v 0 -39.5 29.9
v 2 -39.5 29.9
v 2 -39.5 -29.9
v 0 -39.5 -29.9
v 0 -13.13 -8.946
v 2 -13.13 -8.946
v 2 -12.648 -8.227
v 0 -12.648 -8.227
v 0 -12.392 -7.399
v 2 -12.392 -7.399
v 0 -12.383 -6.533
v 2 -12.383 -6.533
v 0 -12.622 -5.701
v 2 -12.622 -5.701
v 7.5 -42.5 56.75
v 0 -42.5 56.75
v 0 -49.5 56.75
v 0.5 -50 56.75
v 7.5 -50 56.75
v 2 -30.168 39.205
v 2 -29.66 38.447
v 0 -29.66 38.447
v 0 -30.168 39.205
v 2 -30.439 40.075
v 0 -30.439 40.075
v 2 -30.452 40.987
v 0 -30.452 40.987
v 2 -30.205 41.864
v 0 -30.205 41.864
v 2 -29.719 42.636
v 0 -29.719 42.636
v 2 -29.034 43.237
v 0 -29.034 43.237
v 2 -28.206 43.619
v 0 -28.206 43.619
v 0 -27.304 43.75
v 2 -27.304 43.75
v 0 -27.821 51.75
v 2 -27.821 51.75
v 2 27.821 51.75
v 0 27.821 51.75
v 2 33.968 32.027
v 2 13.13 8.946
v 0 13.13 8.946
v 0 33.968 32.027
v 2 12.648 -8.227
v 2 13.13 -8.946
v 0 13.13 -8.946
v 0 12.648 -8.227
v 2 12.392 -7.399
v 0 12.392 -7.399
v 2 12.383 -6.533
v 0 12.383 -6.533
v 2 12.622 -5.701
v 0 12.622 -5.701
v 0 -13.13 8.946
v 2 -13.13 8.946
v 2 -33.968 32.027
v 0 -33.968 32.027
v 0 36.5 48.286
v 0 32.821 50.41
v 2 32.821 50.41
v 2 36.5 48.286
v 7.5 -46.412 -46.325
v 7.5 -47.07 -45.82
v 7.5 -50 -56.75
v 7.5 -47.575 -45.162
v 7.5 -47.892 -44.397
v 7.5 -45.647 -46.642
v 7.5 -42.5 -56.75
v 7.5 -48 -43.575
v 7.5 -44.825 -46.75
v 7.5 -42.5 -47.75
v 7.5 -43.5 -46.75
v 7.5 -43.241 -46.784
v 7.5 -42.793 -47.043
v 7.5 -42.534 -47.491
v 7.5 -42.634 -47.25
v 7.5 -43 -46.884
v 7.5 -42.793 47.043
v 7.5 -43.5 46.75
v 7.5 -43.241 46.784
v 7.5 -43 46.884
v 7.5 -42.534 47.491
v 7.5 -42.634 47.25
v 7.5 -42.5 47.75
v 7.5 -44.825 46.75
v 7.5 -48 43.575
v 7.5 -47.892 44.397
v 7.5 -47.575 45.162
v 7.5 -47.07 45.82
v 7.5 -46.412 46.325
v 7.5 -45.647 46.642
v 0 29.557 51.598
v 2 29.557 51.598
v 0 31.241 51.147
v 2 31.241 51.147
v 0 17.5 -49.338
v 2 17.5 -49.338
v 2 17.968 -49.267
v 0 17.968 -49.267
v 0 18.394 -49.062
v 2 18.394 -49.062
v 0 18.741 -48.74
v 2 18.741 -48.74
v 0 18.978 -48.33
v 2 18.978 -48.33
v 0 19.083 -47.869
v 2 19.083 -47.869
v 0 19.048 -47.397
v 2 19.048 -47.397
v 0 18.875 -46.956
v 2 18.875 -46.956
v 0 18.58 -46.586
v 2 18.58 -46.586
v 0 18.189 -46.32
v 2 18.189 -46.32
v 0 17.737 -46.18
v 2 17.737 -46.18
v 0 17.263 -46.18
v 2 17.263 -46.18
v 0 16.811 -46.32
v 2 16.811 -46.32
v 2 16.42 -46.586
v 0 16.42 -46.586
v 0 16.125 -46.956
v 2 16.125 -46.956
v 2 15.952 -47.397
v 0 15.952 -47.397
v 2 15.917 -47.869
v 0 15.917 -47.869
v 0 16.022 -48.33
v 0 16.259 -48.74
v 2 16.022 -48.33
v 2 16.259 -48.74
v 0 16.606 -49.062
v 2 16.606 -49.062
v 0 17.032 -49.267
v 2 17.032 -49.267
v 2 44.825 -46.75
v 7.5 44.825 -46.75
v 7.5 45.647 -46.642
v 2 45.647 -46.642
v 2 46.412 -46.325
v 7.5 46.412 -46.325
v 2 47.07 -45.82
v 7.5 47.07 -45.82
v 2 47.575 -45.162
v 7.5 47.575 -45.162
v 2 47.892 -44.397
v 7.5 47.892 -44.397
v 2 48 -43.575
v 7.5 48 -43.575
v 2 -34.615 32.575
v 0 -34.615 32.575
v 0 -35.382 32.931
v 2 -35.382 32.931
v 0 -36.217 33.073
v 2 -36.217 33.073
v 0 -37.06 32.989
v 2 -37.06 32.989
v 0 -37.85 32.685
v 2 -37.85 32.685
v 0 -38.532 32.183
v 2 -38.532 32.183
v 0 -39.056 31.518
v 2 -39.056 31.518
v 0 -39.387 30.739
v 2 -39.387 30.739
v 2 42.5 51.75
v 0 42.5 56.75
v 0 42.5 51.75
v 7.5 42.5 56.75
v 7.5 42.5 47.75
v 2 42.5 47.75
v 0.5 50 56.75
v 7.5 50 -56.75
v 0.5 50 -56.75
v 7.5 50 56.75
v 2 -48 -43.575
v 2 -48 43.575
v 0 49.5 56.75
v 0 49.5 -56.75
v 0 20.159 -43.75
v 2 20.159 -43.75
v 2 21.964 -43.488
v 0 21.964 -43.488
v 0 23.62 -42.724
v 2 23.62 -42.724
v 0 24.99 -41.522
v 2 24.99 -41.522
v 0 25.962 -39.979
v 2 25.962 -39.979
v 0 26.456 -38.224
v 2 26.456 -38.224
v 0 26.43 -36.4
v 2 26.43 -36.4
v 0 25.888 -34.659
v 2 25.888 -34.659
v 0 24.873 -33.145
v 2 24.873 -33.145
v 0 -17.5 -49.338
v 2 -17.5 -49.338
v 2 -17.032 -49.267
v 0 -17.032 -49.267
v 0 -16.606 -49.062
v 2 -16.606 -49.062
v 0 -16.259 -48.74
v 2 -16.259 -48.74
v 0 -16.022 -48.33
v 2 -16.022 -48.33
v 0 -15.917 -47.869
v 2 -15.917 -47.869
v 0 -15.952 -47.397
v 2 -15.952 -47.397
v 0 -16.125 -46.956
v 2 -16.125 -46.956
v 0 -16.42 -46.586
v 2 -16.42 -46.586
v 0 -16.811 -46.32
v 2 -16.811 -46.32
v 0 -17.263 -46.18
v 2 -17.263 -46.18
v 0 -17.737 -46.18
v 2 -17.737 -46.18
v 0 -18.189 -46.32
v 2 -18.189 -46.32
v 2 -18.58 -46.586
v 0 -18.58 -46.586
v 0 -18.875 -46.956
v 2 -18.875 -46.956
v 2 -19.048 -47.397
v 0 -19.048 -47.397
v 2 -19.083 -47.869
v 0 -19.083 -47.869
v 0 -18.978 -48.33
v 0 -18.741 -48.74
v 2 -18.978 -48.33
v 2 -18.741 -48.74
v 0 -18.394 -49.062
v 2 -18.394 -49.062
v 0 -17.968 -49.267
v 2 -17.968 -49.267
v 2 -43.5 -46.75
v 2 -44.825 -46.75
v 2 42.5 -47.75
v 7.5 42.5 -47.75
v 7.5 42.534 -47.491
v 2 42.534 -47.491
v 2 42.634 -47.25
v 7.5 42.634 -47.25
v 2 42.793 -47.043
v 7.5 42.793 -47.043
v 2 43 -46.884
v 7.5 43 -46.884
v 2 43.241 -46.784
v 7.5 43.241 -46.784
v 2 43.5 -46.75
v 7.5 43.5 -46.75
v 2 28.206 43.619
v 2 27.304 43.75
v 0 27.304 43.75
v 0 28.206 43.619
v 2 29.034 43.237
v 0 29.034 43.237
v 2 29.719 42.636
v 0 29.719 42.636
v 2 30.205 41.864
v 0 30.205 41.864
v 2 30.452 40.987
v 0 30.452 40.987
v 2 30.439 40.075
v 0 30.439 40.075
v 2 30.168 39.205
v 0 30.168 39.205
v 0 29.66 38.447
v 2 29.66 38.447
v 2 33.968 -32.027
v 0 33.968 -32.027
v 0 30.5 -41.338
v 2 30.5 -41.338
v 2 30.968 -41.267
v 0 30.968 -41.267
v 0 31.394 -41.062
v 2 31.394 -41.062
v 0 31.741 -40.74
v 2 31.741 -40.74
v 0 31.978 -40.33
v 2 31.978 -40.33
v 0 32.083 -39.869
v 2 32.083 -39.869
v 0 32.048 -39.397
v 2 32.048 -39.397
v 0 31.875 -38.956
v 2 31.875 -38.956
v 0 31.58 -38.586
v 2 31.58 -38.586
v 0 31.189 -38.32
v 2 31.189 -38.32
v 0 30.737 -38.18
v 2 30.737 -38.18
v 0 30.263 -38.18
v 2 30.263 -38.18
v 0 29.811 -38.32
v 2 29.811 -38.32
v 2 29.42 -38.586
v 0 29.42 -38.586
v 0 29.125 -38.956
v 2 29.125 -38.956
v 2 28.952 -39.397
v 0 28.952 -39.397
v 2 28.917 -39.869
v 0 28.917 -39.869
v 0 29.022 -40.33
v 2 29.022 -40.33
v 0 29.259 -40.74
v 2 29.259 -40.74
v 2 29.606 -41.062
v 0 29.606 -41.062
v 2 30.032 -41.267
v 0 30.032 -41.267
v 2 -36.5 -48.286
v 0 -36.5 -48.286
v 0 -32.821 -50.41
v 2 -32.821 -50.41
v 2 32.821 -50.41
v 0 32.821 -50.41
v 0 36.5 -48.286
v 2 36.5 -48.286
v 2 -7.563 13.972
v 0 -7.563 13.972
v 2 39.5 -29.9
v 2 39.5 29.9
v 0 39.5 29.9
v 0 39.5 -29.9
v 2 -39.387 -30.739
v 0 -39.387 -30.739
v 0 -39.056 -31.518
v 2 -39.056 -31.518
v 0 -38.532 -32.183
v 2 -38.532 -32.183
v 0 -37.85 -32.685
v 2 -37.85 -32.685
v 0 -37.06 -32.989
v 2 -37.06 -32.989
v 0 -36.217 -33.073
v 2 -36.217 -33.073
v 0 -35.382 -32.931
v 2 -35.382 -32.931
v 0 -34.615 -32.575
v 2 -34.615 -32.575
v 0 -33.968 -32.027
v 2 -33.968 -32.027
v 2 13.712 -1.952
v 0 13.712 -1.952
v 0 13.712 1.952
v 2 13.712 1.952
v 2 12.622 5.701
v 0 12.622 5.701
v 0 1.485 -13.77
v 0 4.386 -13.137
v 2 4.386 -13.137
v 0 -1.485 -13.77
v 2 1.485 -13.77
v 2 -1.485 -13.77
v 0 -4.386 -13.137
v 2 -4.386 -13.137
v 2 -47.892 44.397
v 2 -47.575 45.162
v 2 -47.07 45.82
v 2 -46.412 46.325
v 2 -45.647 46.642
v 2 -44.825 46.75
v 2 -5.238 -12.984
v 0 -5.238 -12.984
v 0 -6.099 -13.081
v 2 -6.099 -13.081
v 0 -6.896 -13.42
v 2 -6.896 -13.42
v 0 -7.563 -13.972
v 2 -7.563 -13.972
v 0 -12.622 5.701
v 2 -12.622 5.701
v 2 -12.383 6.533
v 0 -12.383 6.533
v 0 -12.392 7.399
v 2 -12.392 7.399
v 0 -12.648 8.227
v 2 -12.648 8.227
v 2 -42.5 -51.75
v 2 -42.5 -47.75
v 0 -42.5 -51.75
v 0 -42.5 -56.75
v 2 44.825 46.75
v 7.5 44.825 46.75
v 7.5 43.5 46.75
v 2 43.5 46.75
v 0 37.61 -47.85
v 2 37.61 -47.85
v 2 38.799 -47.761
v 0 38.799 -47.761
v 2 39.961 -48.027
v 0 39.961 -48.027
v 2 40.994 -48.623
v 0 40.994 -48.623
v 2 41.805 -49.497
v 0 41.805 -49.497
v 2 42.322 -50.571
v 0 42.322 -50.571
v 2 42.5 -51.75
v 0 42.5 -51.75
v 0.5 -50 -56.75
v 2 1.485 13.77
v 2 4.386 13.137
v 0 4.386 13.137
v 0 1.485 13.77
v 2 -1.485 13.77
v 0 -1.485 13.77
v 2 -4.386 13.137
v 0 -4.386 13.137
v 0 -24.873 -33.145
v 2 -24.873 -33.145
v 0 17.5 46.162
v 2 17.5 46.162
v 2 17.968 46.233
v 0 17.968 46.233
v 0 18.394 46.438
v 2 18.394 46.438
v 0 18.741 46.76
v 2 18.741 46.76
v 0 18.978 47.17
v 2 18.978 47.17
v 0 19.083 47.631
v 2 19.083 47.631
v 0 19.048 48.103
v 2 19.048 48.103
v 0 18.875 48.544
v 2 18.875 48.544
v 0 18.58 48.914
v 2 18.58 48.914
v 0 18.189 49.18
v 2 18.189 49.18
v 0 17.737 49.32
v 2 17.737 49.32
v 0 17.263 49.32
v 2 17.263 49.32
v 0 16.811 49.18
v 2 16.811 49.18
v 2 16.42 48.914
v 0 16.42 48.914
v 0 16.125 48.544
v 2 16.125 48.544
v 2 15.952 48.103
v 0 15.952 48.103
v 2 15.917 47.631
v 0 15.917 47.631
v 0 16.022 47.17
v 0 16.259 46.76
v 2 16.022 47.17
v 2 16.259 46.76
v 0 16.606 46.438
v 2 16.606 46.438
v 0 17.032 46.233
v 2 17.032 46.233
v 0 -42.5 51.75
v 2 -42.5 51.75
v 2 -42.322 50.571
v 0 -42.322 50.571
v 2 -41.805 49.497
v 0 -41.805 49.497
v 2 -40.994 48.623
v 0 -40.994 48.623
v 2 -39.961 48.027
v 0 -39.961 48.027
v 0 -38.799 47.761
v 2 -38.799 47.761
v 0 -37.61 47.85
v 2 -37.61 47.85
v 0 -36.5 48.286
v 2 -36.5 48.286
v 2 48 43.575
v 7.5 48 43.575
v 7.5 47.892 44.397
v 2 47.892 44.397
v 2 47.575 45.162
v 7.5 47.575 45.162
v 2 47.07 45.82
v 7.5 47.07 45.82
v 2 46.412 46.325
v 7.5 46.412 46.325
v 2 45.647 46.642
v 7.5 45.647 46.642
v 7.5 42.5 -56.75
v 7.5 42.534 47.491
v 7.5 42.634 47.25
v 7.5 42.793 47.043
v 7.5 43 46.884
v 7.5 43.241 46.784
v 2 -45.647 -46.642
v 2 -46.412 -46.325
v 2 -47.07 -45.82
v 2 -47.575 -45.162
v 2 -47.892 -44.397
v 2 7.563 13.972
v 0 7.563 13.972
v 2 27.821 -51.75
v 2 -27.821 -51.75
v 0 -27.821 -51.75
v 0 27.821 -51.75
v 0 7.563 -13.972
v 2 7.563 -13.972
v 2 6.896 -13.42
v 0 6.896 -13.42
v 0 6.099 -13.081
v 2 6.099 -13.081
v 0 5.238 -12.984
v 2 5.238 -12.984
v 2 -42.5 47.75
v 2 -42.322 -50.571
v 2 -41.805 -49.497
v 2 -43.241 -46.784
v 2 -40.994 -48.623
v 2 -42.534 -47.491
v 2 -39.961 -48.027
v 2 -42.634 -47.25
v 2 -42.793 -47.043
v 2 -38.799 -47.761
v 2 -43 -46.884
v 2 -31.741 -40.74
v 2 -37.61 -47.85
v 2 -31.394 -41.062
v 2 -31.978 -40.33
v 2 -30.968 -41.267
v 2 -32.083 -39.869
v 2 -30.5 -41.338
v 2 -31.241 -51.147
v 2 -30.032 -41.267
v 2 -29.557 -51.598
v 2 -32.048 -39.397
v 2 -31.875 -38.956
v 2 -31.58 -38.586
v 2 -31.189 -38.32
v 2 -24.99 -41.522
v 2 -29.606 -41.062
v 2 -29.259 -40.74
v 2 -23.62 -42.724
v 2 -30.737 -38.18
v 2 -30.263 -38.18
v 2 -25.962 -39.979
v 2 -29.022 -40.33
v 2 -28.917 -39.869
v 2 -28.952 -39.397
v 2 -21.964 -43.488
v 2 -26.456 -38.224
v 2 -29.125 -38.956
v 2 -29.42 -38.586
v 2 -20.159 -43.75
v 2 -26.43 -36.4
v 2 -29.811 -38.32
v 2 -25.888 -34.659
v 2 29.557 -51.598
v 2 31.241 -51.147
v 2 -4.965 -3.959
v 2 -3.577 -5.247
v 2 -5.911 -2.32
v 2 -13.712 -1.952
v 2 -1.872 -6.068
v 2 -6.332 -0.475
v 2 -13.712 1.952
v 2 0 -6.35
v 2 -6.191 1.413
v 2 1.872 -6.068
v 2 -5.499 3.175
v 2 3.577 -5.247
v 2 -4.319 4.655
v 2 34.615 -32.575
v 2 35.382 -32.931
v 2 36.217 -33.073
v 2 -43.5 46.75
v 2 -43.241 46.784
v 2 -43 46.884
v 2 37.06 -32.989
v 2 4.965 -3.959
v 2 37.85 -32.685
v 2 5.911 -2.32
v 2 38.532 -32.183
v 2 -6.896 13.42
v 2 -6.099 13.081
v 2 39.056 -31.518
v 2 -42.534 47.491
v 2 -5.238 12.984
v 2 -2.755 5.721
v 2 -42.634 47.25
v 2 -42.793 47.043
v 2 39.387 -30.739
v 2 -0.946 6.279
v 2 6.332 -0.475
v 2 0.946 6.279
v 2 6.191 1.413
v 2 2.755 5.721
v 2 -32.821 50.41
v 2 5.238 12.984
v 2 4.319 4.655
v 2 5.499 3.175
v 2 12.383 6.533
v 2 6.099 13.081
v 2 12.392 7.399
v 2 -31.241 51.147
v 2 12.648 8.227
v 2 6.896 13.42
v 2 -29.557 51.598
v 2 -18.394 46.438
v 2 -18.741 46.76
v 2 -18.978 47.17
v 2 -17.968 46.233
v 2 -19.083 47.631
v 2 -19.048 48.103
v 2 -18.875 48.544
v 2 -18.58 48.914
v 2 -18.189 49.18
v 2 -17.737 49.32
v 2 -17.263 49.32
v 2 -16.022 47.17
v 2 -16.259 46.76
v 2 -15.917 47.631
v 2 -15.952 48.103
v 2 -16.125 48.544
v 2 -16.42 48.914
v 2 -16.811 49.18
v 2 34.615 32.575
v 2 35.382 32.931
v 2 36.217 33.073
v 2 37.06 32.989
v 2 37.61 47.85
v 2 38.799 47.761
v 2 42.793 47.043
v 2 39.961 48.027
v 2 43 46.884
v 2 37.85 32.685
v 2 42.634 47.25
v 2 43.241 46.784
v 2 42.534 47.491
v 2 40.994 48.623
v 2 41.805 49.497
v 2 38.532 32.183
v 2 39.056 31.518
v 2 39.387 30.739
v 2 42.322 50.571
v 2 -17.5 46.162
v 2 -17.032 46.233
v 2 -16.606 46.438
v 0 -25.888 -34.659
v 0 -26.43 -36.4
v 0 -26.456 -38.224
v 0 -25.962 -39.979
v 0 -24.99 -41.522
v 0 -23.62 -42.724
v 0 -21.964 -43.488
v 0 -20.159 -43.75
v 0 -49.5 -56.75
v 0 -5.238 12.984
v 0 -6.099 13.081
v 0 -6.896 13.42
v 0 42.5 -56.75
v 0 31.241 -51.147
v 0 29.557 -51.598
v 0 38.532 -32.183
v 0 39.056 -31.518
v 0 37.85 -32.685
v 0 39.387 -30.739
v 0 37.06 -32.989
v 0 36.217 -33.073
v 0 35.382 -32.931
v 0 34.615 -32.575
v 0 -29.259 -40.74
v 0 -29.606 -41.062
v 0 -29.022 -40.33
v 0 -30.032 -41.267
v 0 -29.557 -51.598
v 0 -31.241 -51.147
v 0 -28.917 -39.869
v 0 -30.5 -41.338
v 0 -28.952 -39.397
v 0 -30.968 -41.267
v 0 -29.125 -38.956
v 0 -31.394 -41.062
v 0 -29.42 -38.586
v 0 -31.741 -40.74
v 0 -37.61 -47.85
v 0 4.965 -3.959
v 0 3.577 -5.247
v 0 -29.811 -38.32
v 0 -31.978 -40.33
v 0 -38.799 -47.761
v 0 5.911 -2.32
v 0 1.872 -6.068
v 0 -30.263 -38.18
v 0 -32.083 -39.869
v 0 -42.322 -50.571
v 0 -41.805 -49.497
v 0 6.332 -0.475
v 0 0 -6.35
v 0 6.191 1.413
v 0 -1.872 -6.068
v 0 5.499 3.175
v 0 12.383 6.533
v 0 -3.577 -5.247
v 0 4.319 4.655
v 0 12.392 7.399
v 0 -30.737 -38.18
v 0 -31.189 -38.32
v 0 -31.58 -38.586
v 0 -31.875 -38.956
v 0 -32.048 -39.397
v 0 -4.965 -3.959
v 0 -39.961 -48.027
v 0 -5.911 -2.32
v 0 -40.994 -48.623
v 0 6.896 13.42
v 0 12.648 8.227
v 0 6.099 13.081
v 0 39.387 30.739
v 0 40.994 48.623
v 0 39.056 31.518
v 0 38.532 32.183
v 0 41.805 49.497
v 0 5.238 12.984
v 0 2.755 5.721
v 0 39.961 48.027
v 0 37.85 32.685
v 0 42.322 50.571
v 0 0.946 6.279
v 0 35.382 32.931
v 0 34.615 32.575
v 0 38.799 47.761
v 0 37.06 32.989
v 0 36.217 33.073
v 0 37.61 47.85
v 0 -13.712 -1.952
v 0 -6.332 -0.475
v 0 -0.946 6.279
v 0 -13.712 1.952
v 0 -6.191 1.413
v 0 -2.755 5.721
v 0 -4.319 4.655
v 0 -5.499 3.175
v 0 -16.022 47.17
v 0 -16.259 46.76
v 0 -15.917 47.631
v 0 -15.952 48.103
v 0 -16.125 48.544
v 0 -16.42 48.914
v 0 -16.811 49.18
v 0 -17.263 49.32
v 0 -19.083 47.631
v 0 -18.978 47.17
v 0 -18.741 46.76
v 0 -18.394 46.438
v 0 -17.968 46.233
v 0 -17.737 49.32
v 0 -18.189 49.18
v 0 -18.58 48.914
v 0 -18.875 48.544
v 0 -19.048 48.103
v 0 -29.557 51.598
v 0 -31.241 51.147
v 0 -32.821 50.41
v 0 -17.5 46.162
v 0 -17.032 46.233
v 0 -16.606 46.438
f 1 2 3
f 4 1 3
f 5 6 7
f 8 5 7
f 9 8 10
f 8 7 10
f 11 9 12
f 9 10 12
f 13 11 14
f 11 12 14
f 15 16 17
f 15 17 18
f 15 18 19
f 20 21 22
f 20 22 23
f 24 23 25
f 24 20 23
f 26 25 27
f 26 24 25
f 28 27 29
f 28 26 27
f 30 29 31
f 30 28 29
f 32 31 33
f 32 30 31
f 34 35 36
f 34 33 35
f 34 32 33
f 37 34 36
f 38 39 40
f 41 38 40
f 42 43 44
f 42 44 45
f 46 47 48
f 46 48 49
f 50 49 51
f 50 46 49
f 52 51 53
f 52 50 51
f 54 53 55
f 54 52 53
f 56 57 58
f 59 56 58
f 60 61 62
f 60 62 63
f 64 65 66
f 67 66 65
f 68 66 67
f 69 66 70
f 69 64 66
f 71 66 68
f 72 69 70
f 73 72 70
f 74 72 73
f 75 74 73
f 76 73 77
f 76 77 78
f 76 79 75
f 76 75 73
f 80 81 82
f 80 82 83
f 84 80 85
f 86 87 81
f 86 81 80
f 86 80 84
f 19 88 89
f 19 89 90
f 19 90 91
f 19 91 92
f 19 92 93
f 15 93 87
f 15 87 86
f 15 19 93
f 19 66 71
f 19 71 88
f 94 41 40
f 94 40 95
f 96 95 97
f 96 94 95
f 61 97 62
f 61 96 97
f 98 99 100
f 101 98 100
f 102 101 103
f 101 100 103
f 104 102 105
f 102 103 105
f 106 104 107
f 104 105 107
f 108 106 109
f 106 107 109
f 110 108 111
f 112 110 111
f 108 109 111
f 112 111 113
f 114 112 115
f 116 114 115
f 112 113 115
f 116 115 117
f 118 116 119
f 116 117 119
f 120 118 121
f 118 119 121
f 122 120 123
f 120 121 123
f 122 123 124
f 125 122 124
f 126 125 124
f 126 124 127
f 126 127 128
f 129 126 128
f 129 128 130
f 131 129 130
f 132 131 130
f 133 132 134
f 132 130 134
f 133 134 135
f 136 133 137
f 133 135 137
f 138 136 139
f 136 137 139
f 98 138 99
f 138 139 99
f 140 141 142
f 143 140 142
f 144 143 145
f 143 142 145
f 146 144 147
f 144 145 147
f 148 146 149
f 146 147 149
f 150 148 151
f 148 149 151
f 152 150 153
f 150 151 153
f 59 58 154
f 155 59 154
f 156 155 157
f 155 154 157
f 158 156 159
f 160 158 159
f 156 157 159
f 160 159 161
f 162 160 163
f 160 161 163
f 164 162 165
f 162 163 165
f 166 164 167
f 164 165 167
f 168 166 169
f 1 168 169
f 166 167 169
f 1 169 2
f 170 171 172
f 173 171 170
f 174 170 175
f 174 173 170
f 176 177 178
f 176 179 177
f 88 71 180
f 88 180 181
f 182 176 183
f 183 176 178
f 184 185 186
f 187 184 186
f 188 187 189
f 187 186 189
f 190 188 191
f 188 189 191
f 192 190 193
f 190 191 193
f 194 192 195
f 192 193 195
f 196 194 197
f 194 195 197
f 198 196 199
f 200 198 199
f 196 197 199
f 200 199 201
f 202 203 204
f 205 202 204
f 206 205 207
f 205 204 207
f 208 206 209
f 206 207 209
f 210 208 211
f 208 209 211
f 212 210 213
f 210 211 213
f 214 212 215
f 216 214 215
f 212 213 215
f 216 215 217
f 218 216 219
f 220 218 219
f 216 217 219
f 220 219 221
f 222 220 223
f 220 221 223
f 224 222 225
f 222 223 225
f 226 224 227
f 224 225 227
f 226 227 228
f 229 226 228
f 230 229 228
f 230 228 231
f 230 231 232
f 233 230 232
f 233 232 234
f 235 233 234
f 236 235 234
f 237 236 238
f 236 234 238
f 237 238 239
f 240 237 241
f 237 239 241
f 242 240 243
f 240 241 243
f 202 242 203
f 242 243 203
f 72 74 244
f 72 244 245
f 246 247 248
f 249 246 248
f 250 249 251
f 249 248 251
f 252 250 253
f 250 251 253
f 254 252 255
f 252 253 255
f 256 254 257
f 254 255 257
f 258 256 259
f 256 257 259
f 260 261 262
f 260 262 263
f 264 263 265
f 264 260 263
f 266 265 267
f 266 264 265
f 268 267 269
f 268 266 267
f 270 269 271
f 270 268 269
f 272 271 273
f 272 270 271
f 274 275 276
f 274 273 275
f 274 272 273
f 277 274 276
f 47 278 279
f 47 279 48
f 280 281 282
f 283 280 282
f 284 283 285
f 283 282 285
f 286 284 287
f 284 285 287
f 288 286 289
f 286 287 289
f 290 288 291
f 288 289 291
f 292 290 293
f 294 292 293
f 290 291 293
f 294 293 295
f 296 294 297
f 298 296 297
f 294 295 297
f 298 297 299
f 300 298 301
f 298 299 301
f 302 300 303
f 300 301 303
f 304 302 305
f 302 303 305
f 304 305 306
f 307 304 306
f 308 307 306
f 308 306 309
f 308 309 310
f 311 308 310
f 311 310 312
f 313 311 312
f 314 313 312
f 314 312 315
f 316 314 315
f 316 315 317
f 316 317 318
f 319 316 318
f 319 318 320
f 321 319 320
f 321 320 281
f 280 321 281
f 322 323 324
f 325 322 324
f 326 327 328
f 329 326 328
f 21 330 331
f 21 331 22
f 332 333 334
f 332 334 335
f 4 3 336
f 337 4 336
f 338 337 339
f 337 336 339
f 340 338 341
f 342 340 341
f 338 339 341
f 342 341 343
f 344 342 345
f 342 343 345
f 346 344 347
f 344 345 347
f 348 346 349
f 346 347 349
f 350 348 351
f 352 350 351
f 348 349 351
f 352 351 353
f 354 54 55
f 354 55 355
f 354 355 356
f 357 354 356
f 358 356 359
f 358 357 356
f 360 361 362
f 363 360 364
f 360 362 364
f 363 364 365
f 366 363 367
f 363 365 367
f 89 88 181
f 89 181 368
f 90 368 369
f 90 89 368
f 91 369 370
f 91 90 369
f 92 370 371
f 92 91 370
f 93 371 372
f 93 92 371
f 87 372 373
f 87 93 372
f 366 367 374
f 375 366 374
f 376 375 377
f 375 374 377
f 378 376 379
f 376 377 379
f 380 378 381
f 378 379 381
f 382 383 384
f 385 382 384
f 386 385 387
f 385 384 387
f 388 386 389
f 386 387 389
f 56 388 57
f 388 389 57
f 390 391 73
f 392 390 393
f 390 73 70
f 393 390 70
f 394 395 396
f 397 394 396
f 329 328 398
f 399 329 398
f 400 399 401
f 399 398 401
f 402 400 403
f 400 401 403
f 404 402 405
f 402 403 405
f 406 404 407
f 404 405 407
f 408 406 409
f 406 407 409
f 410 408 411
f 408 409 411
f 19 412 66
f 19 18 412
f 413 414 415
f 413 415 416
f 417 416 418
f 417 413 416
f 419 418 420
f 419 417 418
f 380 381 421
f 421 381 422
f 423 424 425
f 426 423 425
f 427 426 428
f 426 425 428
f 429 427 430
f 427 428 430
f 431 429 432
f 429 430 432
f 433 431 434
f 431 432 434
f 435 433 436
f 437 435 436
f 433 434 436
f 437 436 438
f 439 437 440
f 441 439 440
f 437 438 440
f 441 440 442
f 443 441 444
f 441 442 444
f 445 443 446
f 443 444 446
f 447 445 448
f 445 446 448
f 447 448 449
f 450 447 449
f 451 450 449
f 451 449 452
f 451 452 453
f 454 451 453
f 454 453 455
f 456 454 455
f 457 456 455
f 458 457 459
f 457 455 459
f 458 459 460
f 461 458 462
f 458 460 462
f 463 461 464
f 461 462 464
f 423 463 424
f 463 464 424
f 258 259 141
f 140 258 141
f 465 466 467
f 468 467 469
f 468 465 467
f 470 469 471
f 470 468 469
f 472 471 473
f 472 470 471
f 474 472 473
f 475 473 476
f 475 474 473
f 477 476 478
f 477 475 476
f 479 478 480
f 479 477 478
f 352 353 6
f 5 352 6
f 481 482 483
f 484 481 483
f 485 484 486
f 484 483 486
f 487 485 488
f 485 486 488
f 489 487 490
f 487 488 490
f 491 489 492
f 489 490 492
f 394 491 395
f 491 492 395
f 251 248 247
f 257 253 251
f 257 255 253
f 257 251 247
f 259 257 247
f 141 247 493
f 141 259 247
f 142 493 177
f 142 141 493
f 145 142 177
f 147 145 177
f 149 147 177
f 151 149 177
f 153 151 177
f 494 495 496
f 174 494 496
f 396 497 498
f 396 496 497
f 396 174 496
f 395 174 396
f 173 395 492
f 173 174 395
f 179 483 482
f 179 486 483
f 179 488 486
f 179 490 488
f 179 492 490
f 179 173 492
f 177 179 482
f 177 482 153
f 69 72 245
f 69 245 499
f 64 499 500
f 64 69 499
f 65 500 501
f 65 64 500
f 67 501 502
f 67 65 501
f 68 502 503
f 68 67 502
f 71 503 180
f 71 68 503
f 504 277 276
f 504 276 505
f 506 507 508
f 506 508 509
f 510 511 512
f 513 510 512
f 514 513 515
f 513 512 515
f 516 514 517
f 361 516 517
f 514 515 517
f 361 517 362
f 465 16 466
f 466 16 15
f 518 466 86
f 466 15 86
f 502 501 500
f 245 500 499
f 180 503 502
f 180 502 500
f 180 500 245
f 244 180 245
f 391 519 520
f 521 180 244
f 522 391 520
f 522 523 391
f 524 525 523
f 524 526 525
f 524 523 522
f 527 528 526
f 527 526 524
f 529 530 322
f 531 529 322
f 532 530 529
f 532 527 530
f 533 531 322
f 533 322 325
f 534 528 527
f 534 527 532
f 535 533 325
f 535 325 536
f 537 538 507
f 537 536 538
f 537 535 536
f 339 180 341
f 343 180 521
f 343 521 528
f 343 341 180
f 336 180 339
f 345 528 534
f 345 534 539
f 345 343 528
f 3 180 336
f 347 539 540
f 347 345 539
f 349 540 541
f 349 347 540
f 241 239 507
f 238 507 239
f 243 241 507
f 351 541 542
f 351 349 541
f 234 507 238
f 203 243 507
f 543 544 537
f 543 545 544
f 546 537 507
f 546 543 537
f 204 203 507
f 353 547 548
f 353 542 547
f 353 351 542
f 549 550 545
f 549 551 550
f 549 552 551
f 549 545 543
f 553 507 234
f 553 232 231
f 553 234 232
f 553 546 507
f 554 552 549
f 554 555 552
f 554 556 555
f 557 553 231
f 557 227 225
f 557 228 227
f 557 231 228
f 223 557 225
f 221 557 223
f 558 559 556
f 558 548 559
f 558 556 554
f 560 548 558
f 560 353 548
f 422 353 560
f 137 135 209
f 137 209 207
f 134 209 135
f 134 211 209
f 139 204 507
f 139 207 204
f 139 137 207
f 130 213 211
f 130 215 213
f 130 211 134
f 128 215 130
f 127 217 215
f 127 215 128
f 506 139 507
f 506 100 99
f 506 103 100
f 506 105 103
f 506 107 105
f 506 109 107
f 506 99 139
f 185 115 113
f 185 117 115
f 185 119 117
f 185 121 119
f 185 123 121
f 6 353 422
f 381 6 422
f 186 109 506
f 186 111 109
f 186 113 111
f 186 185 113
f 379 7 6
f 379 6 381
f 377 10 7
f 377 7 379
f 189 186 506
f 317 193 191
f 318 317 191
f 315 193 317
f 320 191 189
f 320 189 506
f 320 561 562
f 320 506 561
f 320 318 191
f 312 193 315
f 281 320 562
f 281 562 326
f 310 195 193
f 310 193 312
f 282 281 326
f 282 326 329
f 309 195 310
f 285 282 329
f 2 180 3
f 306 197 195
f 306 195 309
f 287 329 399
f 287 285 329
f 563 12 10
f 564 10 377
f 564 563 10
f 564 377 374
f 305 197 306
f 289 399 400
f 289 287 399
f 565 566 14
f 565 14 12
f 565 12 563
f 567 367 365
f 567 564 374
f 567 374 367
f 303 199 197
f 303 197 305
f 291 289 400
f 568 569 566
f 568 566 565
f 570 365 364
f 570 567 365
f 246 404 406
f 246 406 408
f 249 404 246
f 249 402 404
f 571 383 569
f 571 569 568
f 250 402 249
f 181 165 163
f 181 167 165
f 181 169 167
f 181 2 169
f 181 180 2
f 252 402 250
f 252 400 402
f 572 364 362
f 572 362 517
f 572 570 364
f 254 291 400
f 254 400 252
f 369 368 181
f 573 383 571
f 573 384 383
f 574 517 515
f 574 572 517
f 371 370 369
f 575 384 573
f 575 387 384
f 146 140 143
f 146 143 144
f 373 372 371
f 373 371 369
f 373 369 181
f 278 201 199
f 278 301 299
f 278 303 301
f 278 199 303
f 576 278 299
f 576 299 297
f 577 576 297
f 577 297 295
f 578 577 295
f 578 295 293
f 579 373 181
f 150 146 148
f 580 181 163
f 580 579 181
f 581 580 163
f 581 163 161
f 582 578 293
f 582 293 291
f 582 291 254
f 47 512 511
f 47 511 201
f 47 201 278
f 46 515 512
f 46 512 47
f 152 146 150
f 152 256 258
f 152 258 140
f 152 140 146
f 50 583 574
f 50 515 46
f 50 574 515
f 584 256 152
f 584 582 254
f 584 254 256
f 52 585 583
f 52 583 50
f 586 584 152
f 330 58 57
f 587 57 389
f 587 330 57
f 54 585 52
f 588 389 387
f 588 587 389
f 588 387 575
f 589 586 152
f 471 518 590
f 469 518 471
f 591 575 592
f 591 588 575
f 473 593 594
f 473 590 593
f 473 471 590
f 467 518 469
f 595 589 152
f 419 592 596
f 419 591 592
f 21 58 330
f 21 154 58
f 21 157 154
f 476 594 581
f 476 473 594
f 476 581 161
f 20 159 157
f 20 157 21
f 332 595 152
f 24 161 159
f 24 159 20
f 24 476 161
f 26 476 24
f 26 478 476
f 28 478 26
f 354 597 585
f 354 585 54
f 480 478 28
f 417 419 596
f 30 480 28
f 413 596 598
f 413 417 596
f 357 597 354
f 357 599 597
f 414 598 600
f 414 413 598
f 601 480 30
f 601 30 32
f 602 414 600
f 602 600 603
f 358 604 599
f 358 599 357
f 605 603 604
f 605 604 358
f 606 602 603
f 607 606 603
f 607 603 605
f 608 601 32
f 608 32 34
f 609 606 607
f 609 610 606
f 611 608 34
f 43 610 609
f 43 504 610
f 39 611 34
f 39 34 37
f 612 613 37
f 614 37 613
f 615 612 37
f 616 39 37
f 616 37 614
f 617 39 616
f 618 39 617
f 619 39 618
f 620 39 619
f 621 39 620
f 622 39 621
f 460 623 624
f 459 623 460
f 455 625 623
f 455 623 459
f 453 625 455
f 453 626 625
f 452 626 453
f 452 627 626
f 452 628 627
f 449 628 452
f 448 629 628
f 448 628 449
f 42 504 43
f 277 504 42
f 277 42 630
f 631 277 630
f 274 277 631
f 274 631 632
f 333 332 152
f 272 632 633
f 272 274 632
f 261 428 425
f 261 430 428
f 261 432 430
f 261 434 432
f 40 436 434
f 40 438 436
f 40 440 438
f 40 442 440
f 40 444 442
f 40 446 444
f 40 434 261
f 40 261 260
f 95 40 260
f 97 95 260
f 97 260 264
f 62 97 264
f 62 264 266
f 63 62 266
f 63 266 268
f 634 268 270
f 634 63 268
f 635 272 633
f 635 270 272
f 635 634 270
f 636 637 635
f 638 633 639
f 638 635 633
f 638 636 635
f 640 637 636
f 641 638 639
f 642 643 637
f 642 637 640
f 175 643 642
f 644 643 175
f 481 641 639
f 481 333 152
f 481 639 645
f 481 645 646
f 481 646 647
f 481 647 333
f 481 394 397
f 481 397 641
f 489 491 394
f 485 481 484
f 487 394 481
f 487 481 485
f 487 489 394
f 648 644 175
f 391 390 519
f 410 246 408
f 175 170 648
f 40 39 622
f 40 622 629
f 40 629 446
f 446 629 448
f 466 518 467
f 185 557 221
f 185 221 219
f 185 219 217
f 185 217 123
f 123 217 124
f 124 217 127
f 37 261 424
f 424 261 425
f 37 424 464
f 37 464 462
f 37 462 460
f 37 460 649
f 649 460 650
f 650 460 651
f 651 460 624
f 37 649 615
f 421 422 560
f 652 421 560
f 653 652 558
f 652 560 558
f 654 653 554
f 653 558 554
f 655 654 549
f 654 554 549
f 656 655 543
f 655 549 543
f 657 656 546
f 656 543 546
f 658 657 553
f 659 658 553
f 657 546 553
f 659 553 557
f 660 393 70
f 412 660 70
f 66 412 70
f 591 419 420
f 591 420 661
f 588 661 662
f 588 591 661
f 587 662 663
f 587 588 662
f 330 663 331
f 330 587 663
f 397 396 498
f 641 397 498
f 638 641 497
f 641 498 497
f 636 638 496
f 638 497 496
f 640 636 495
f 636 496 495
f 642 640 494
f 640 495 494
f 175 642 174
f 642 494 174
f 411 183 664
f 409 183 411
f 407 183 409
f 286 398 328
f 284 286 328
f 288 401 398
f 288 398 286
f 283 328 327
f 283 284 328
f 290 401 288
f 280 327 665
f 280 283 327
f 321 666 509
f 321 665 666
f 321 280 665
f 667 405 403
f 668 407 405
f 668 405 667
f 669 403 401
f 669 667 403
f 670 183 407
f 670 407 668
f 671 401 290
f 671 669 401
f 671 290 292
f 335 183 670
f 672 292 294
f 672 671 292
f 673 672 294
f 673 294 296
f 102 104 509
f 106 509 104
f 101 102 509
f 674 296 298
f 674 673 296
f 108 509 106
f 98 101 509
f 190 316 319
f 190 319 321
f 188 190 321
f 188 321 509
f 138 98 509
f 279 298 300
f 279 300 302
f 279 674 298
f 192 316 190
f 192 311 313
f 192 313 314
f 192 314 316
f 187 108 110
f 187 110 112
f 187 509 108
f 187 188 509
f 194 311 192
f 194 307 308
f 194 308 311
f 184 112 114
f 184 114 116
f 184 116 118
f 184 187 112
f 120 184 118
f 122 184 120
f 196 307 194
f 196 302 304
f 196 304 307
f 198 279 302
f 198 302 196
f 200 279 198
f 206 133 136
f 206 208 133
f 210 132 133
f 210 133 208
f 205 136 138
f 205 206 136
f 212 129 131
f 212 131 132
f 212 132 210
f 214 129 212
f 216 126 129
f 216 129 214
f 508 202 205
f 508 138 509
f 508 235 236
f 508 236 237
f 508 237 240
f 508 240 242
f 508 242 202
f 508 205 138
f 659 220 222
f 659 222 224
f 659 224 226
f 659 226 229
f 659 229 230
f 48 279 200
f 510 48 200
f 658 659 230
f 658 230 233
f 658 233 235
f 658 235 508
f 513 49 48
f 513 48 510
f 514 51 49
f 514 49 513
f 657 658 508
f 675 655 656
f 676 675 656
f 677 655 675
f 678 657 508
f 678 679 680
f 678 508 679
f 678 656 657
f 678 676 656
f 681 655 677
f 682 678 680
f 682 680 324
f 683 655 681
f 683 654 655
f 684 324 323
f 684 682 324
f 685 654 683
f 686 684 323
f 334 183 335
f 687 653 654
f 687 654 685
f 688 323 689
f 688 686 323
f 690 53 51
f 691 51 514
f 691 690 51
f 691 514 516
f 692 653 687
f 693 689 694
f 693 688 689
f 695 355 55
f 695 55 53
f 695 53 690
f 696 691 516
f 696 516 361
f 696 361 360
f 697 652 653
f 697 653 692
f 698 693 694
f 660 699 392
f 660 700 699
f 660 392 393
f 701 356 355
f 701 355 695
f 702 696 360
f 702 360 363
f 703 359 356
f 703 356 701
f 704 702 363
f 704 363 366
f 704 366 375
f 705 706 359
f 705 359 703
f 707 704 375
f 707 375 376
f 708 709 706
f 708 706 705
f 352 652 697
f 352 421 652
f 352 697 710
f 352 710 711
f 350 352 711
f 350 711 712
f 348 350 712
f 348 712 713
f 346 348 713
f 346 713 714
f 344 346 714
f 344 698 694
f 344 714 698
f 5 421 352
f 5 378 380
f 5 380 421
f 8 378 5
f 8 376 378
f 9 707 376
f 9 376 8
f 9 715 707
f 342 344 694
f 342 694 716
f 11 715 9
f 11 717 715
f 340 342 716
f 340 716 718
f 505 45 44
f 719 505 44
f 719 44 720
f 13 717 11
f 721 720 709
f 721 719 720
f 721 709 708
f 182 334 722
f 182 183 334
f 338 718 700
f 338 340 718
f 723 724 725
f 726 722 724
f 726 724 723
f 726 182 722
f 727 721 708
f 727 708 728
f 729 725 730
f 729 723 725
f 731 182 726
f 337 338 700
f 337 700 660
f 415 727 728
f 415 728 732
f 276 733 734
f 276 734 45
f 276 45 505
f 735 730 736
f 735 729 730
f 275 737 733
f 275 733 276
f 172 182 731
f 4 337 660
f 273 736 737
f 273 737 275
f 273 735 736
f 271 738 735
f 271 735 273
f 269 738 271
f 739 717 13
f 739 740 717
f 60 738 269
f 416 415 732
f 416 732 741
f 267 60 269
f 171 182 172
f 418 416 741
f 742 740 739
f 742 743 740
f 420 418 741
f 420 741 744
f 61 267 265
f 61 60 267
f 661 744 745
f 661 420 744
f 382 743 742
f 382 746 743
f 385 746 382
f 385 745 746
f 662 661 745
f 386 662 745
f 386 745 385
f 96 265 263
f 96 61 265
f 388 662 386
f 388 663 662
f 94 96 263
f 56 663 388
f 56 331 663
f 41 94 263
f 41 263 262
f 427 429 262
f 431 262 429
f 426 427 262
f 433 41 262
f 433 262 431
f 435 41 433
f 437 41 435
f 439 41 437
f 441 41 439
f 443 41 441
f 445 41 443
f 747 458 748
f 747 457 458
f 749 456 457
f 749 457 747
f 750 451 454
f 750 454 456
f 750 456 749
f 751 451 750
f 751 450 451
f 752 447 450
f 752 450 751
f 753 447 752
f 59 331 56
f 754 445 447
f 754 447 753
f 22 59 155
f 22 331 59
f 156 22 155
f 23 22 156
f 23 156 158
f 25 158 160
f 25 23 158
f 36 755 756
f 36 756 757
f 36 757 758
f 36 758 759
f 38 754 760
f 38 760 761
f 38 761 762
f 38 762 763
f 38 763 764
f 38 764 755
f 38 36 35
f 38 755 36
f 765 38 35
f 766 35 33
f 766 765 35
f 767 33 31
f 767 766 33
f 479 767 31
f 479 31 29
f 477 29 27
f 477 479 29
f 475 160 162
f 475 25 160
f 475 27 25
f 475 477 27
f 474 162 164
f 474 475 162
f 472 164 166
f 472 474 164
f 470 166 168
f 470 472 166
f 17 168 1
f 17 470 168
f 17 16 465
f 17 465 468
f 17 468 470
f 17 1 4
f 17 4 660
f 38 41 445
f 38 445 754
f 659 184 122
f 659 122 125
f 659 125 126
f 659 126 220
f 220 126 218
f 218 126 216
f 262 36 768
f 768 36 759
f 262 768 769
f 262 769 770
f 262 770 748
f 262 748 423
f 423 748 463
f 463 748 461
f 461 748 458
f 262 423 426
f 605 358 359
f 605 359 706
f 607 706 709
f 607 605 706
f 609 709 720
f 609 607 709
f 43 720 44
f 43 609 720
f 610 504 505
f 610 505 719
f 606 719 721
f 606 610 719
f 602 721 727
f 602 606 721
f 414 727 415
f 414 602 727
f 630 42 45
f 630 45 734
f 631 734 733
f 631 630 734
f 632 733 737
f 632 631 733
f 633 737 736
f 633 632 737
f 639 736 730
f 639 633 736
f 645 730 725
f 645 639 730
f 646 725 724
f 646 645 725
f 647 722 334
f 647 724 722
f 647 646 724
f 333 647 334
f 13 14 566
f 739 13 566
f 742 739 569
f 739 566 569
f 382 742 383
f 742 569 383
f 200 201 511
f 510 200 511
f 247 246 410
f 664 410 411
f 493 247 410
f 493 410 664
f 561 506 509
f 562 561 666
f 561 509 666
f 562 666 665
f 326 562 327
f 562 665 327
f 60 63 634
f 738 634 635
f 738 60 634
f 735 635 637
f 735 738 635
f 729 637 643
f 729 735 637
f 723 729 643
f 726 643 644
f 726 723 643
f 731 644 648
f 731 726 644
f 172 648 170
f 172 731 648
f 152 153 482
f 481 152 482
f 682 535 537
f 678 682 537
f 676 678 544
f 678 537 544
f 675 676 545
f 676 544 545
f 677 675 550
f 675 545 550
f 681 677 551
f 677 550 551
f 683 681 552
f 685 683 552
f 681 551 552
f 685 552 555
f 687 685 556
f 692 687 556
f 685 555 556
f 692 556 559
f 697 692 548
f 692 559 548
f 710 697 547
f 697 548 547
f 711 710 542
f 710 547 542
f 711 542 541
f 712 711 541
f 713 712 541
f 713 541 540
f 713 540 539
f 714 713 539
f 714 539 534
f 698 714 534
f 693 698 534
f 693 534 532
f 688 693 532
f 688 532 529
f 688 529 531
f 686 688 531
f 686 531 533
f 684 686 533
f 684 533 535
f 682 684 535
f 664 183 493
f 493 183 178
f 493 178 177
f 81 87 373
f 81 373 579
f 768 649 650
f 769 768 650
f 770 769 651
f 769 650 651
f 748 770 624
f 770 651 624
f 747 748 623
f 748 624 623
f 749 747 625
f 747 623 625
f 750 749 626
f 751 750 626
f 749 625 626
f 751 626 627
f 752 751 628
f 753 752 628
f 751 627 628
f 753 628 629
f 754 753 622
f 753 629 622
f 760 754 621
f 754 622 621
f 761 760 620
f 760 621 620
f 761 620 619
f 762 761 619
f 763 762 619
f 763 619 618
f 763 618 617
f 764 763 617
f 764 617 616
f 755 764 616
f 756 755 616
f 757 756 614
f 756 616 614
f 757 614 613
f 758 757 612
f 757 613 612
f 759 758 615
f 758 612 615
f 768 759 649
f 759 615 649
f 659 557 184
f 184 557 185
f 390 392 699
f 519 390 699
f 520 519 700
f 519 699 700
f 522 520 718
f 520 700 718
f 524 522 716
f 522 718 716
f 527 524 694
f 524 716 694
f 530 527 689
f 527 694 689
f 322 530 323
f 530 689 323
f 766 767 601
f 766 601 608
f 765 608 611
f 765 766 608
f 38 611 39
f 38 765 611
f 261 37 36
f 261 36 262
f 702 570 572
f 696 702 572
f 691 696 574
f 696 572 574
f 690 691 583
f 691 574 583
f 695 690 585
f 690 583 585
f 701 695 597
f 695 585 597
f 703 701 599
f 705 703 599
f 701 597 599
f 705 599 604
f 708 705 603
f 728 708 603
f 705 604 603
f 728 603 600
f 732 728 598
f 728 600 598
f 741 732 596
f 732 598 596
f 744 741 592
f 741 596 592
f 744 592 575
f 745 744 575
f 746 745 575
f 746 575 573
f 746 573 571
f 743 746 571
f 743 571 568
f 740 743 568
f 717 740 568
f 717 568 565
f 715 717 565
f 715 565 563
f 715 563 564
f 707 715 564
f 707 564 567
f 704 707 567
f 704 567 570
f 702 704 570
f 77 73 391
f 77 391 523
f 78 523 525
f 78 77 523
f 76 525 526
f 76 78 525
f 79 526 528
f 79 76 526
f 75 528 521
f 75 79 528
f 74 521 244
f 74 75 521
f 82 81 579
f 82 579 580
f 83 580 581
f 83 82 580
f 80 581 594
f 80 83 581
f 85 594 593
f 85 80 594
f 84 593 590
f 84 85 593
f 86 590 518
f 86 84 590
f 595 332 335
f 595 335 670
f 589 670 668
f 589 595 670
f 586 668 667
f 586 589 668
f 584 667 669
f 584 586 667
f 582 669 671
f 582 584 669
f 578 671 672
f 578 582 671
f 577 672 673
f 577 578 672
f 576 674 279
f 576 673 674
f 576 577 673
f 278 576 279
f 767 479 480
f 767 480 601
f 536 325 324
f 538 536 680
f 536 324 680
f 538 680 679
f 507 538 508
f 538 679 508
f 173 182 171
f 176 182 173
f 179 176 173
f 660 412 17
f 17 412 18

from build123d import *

# Parameters (mm, degrees)
BOSS_EXTRUDE1_DEPTH = 56.75
SKETCH2_W           = 5
SKETCH2_H           = 85
SKETCH2_R           = 1.5875
CUT_EXTRUDE1_DEPTH  = 2
SKETCH3_R           = 6.35
SKETCH3_R_2         = 1.5875
CUT_EXTRUDE2_DEPTH  = 3
CHAMFER1_SIZE       = 0.5
CUT_EXTRUDE3_DEPTH  = 5.5
CUT_EXTRUDE4_DEPTH  = 10


with BuildPart() as part:
    # Sketch1 → Boss-Extrude1 (new body, symmetric)
    with BuildSketch(Plane.XY):
        Polygon((0, 50), (0, -50), (7.5, -50), (7.5, -42.5), (2, -42.5), (2, 42.5), (7.5, 42.5), (7.5, 50), align=None)
    extrude(amount=BOSS_EXTRUDE1_DEPTH, both=True)

    # Sketch2 → Cut-Extrude1 (cut)
    with BuildSketch(Plane(origin=(2, 0, 0), x_dir=(0, 0, -1), z_dir=(1, 0, 0))):
        with Locations((-54.25, 0)):
            Rectangle(SKETCH2_W, SKETCH2_H)
        with Locations((54.25, 0)):
            Rectangle(SKETCH2_W, SKETCH2_H)
        with Locations((-47.75, 17.5)):
            Circle(SKETCH2_R)
        with Locations((-47.75, -17.5)):
            Circle(SKETCH2_R)
        with Locations((47.75, 17.5)):
            Circle(SKETCH2_R)
        with Locations((47.75, -17.5)):
            Circle(SKETCH2_R)
    extrude(amount=-CUT_EXTRUDE1_DEPTH, mode=Mode.SUBTRACT)

    # Sketch3 → Cut-Extrude2 (cut, through all)
    with BuildSketch(Plane(origin=(2, 0, 0), x_dir=(0, 0, -1), z_dir=(1, 0, 0))):
        Circle(SKETCH3_R)
        with Locations((39.75, 30.5)):
            Circle(SKETCH3_R_2)
        with Locations((39.75, -30.5)):
            Circle(SKETCH3_R_2)
        with BuildLine():
            Line((-29.899655804, -39.5), (29.899655804, -39.5))
            ThreePointArc((29.899655804, -39.5), (32.863003185, -37.464823364), (32.027336169, -33.968392001))
            Line((32.027336169, -33.968392001), (8.946350194, -13.129558949))
            ThreePointArc((8.946350194, -13.129558949), (7.399307524, -12.392275536), (5.701057458, -12.622220243))
            ThreePointArc((5.701057458, -12.622220243), (0, -13.85), (-5.701057458, -12.622220243))
            ThreePointArc((-5.701057458, -12.622220243), (-7.399307524, -12.392275536), (-8.946350194, -13.129558949))
            Line((-8.946350194, -13.129558949), (-32.027336169, -33.968392001))
            ThreePointArc((-32.027336169, -33.968392001), (-32.863003185, -37.464823364), (-29.899655804, -39.5))
        make_face()
        with BuildLine():
            Line((-43.75, -27.303546383), (-43.75, 27.303546383))
            ThreePointArc((-43.75, 27.303546383), (-41.864426198, 30.204926241), (-38.447319635, 29.660154382))
            Line((-38.447319635, 29.660154382), (-13.972366805, 7.562768399))
            ThreePointArc((-13.972366805, 7.562768399), (-13.081370721, 6.098851109), (-13.137175803, 4.386013216))
            ThreePointArc((-13.137175803, 4.386013216), (-13.85, 0), (-13.137175803, -4.386013216))
            ThreePointArc((-13.137175803, -4.386013216), (-13.081370721, -6.098851109), (-13.972366805, -7.562768399))
            Line((-13.972366805, -7.562768399), (-38.447319635, -29.660154382))
            ThreePointArc((-38.447319635, -29.660154382), (-41.864426198, -30.204926241), (-43.75, -27.303546383))
        make_face()
        with BuildLine():
            Line((-29.899655804, 39.5), (29.899655804, 39.5))
            ThreePointArc((29.899655804, 39.5), (32.863003185, 37.464823364), (32.027336169, 33.968392001))
            Line((32.027336169, 33.968392001), (8.946350194, 13.129558949))
            ThreePointArc((8.946350194, 13.129558949), (7.399307524, 12.392275536), (5.701057458, 12.622220243))
            ThreePointArc((5.701057458, 12.622220243), (0, 13.85), (-5.701057458, 12.622220243))
            ThreePointArc((-5.701057458, 12.622220243), (-7.399307524, 12.392275536), (-8.946350194, 13.129558949))
            Line((-8.946350194, 13.129558949), (-32.027336169, 33.968392001))
            ThreePointArc((-32.027336169, 33.968392001), (-32.863003185, 37.464823364), (-29.899655804, 39.5))
        make_face()
        with BuildLine():
            Line((43.75, -20.159375539), (43.75, 20.159375539))
            ThreePointArc((43.75, 20.159375539), (39.978852396, 25.962135255), (33.144639269, 24.872591538))
            Line((33.144639269, 24.872591538), (13.972366805, 7.562768399))
            ThreePointArc((13.972366805, 7.562768399), (13.081370721, 6.098851109), (13.137175803, 4.386013216))
            ThreePointArc((13.137175803, 4.386013216), (13.85, 0), (13.137175803, -4.386013216))
            ThreePointArc((13.137175803, -4.386013216), (13.081370721, -6.098851109), (13.972366805, -7.562768399))
            Line((13.972366805, -7.562768399), (33.144639269, -24.872591538))
            ThreePointArc((33.144639269, -24.872591538), (39.978852396, -25.962135255), (43.75, -20.159375539))
        make_face()
    extrude(amount=-CUT_EXTRUDE2_DEPTH, mode=Mode.SUBTRACT)

    # Chamfer1
    chamfer1_edges = [part.edges().sort_by_distance(p)[0] for p in [
        (0, -50, 0),
        (0, 50, 0),
    ]]
    chamfer(chamfer1_edges, length=CHAMFER1_SIZE)

    # Sketch4 → Cut-Extrude3 (cut)
    with BuildSketch(Plane(origin=(7.5, 0, 0), x_dir=(0, 0, -1), z_dir=(1, 0, 0))):
        with BuildLine():
            Line((43.575, -48), (-43.575, -48))
            ThreePointArc((-43.575, -48), (-45.82006403, -47.07006403), (-46.75, -44.825))
            Line((-46.75, -44.825), (-46.75, -43.5))
            ThreePointArc((-46.75, -43.5), (-47.042893219, -42.792893219), (-47.75, -42.5))
            Line((-47.75, -42.5), (47.75, -42.5))
            ThreePointArc((47.75, -42.5), (47.042893219, -42.792893219), (46.75, -43.5))
            Line((46.75, -43.5), (46.75, -44.825))
            ThreePointArc((46.75, -44.825), (45.82006403, -47.07006403), (43.575, -48))
        make_face()
        with BuildLine():
            Line((-46.75, 44.825), (-46.75, 43.5))
            ThreePointArc((-46.75, 43.5), (-47.042893219, 42.792893219), (-47.75, 42.5))
            Line((-47.75, 42.5), (47.75, 42.5))
            ThreePointArc((47.75, 42.5), (47.042893219, 42.792893219), (46.75, 43.5))
            Line((46.75, 43.5), (46.75, 44.825))
            ThreePointArc((46.75, 44.825), (45.82006403, 47.07006403), (43.575, 48))
            Line((43.575, 48), (-43.575, 48))
            ThreePointArc((-43.575, 48), (-45.82006403, 47.07006403), (-46.75, 44.825))
        make_face()
    extrude(amount=-CUT_EXTRUDE3_DEPTH, mode=Mode.SUBTRACT)

    # Sketch5 → Cut-Extrude4 (cut)
    with BuildSketch(Plane.ZY):
        with BuildLine():
            ThreePointArc((-51.75, 27.820508076), (-51.409258263, 30.408698527), (-50.410254038, 32.820508076))
            Line((-50.410254038, 32.820508076), (-48.285898385, 36.5))
            ThreePointArc((-48.285898385, 36.5), (-48.285898385, 40.5), (-51.75, 42.5))
            Line((-51.75, 42.5), (-51.75, 27.820508076))
        make_face()
        with BuildLine():
            ThreePointArc((-50.410254038, -32.820508076), (-51.409258263, -30.408698527), (-51.75, -27.820508076))
            Line((-51.75, -27.820508076), (-51.75, -42.5))
            ThreePointArc((-51.75, -42.5), (-48.285898385, -40.5), (-48.285898385, -36.5))
            Line((-48.285898385, -36.5), (-50.410254038, -32.820508076))
        make_face()
    cut_extrude4 = extrude(amount=-CUT_EXTRUDE4_DEPTH, mode=Mode.SUBTRACT)

    # Mirror1: Cut-Extrude4 across plane
    add(cut_extrude4.mirror(Plane.XY), mode=Mode.SUBTRACT)


solid = part.part
